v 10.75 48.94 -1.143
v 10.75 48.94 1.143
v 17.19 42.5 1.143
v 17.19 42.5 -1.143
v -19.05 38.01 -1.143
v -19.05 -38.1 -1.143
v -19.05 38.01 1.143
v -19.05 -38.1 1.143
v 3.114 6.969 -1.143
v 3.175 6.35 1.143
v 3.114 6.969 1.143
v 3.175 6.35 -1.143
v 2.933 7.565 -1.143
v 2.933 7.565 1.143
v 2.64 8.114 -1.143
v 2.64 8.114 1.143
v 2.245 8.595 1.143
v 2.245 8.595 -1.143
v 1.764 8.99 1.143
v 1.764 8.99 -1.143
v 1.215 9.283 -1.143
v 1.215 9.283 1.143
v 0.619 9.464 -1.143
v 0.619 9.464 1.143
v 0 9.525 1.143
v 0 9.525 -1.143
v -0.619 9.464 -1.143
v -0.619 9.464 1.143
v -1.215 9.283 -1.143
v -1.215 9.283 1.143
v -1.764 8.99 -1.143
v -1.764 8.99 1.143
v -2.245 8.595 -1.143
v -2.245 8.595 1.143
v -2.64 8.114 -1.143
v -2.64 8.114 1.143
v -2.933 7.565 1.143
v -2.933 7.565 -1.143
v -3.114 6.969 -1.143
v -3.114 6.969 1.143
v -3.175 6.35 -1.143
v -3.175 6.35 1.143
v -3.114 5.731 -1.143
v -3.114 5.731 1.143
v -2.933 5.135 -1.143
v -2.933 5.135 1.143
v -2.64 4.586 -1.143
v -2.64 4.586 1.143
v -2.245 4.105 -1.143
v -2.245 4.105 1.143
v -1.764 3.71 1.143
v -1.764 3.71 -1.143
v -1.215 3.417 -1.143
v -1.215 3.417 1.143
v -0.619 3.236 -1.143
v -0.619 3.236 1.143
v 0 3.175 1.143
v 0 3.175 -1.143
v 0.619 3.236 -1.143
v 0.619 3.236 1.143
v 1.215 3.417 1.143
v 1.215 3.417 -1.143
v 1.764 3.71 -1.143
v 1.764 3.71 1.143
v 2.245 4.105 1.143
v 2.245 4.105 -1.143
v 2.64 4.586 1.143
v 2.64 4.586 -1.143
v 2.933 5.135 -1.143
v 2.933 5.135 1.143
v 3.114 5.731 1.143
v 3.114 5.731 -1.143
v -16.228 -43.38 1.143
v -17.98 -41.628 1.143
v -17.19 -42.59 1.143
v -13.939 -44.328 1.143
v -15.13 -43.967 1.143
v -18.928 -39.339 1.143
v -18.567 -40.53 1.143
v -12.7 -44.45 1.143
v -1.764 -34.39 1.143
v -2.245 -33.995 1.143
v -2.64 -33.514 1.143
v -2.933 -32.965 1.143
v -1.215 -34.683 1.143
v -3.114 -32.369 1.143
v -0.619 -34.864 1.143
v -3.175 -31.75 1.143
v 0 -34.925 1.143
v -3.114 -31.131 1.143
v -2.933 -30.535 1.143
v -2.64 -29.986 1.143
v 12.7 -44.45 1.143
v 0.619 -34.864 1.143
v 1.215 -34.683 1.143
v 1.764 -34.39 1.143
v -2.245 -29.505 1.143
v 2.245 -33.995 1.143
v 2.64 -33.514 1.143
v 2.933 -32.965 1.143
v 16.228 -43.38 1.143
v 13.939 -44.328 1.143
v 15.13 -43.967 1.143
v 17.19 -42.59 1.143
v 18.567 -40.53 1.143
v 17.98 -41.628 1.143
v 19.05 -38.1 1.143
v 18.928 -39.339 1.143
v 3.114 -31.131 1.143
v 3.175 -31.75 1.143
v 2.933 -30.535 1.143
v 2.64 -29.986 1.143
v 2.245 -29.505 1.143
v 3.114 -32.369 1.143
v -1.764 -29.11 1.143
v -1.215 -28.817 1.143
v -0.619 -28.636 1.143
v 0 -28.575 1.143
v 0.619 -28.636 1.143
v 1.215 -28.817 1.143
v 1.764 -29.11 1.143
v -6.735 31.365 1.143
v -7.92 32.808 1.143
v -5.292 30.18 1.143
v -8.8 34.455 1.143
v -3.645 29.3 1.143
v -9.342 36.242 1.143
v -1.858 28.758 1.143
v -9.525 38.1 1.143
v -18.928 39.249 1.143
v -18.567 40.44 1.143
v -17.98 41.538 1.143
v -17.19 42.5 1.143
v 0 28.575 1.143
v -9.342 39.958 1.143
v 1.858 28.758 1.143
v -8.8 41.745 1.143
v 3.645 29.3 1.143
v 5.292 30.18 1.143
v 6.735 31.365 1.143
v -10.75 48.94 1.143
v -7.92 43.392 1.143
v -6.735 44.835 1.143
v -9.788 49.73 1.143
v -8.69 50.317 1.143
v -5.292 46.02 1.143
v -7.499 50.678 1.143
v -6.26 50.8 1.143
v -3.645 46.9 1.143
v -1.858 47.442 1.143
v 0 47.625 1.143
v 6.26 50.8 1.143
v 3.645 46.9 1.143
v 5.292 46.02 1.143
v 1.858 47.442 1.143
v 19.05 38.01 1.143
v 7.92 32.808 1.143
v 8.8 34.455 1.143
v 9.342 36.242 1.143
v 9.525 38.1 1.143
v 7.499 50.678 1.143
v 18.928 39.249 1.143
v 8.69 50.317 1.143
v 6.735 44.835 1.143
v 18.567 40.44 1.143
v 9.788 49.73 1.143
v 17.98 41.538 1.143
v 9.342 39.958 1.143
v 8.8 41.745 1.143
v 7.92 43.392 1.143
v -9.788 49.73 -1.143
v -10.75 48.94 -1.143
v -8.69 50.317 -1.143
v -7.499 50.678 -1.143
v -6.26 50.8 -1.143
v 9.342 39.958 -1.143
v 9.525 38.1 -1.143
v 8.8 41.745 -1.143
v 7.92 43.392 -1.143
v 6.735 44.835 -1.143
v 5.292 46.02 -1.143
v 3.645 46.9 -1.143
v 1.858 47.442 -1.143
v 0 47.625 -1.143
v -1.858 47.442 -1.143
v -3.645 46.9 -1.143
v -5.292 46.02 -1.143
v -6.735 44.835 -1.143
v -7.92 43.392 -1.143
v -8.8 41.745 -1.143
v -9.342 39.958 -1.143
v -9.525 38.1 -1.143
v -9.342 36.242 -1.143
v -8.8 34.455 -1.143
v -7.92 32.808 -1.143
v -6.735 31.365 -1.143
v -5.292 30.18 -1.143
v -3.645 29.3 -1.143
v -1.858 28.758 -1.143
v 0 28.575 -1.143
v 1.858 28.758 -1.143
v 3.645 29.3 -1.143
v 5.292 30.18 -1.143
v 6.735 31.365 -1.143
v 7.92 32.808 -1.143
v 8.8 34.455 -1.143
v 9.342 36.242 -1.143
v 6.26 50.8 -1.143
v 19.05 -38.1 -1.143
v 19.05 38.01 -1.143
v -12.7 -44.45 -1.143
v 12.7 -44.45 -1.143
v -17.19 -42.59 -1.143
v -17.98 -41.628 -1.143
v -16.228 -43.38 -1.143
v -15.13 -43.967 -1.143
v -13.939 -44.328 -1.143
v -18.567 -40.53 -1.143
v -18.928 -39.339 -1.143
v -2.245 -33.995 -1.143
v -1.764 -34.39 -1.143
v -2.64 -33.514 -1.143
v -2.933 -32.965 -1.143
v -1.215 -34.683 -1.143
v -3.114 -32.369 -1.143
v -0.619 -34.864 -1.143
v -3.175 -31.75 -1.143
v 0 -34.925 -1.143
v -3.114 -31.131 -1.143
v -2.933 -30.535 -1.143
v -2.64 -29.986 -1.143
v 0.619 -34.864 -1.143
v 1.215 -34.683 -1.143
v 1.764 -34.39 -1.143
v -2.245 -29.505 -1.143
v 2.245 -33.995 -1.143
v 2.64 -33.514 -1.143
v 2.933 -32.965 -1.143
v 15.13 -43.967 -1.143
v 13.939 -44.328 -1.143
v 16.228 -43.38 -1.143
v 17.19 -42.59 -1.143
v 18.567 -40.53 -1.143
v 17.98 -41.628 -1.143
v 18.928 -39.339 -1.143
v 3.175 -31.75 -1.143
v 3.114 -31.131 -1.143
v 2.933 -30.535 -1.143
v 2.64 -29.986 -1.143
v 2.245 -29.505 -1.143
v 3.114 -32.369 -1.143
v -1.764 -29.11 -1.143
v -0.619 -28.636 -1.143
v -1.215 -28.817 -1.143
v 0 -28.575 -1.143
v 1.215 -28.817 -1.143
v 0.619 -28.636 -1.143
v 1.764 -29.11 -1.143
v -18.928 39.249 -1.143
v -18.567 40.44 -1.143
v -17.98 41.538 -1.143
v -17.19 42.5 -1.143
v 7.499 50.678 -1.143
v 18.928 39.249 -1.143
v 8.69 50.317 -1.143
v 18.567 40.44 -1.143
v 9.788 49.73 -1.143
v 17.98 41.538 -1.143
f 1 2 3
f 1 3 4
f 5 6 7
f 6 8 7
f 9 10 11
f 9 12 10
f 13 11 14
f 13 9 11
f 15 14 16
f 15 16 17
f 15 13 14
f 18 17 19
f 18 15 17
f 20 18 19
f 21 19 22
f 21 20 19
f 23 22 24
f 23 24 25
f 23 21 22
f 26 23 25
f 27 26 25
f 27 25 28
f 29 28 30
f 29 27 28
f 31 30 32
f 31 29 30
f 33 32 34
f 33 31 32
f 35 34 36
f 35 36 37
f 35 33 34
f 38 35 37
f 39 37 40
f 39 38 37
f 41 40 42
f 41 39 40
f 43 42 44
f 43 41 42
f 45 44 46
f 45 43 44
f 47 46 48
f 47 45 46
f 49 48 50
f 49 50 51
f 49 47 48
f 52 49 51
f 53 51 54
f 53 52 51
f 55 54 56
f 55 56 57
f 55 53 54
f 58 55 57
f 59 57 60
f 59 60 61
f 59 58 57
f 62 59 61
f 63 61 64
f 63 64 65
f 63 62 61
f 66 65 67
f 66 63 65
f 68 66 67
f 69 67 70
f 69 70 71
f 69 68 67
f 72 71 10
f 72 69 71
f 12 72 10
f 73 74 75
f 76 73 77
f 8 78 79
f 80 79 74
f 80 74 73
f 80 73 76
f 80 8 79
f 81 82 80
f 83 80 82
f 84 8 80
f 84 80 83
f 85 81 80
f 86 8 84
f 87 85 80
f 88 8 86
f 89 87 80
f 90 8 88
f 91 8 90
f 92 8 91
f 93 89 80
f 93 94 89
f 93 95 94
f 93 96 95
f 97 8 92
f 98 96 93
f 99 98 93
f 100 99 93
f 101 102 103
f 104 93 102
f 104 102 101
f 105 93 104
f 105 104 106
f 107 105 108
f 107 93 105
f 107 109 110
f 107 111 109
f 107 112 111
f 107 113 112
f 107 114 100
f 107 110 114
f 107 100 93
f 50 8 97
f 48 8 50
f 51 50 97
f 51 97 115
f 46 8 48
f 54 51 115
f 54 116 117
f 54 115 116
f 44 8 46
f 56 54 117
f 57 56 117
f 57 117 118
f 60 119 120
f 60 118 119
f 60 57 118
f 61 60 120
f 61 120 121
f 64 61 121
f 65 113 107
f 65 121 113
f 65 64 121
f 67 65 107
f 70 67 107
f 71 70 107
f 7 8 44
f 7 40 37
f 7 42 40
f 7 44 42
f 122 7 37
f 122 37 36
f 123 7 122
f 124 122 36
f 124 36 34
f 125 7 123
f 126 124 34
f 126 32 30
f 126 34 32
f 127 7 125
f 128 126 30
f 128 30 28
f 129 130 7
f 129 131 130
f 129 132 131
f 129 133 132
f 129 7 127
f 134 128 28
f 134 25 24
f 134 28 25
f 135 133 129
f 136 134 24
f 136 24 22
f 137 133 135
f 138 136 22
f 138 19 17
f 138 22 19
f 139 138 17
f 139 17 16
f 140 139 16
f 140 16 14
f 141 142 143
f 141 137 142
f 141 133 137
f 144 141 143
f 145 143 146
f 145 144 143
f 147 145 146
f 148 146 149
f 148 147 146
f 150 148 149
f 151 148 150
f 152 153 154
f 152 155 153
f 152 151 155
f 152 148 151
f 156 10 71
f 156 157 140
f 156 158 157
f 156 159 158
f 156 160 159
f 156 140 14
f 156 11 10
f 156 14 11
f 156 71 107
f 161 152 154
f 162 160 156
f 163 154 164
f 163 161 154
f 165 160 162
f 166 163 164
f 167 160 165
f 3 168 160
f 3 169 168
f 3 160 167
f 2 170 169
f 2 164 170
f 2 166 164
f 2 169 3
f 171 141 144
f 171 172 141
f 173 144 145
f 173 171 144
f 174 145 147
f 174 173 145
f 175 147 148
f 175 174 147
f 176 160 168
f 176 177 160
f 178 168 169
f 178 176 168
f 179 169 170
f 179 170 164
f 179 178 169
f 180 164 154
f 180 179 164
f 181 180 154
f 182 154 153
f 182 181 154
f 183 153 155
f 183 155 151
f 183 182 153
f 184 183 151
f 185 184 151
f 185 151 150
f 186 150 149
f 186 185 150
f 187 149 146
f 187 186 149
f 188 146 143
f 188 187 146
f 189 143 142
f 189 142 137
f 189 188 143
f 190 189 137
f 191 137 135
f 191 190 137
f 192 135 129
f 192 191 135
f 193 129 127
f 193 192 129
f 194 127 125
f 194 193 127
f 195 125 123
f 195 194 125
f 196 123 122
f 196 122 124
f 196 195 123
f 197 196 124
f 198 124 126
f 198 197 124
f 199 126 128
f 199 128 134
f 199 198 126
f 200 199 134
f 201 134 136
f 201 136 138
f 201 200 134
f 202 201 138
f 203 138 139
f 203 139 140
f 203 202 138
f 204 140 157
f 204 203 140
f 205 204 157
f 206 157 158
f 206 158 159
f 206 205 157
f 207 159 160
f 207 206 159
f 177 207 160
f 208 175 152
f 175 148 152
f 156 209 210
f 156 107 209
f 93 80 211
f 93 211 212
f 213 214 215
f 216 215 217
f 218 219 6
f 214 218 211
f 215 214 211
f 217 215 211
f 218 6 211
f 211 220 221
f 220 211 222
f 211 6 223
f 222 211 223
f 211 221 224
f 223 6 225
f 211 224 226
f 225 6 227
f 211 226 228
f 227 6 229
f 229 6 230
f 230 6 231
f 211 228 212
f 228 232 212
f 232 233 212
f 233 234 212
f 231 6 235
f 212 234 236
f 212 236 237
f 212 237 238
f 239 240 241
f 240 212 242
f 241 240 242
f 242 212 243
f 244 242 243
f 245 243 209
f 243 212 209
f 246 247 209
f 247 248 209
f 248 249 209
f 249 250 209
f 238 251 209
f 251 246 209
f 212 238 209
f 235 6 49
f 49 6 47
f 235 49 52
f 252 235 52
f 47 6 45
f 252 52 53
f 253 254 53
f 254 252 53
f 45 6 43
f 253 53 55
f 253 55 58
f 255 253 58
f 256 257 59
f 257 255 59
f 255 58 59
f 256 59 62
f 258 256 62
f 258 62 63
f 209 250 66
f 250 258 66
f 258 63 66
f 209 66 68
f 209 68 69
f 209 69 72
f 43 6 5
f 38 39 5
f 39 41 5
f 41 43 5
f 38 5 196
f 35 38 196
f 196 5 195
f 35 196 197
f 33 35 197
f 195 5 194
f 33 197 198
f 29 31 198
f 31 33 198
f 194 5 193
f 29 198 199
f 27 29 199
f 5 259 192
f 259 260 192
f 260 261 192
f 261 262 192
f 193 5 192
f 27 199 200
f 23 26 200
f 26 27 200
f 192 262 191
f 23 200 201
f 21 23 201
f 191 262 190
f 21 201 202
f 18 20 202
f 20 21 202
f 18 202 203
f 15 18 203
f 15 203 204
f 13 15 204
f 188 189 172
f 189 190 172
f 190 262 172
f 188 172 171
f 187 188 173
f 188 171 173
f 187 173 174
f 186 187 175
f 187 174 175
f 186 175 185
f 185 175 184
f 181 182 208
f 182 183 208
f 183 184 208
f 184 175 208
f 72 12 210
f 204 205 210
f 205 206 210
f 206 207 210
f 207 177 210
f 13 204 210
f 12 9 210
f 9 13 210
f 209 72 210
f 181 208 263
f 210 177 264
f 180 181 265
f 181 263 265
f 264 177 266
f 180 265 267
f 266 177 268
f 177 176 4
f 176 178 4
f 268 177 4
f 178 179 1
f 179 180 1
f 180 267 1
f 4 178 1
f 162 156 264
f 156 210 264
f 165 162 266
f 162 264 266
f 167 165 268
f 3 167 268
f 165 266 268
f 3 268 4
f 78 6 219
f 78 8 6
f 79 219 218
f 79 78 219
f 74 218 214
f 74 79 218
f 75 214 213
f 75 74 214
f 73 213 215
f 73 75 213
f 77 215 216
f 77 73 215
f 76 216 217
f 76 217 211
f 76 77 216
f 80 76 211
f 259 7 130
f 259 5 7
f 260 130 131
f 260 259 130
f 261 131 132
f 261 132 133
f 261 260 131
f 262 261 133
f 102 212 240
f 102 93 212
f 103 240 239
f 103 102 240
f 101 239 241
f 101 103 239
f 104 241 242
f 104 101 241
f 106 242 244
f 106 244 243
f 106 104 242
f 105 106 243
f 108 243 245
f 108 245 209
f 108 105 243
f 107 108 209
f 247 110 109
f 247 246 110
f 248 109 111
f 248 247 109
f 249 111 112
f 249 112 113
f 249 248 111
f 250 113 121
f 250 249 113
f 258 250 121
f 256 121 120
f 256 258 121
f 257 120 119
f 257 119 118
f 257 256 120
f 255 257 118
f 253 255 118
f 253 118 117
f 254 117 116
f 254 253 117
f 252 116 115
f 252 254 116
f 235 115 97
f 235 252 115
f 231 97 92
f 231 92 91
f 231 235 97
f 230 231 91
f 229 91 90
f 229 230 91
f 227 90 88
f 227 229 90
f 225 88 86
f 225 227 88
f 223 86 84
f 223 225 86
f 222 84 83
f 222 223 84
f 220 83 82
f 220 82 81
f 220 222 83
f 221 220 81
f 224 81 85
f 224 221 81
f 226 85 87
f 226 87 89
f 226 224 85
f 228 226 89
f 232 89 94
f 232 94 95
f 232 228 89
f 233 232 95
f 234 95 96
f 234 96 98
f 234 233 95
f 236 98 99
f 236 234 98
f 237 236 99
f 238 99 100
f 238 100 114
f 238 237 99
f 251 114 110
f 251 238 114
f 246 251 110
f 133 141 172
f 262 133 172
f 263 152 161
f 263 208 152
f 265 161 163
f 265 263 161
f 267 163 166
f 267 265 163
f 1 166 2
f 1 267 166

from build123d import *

# Parameters (mm, degrees)
SKETCH1_W           = 38.1
SKETCH1_H           = 101.6
SKETCH1_R           = 3.175
SKETCH1_R_2         = 9.525
BOSS_EXTRUDE1_DEPTH = 1.143
CHAMFER1_SIZE       = 10.16
FILLET1_R           = 6.35
SKETCH2_W           = 38.1
SKETCH2_H           = 6.35
CUT_EXTRUDE1_DEPTH  = 55.302562518
FILLET2_R           = 6.35


with BuildPart() as part:
    # Sketch1 → Boss-Extrude1 (new, symmetric)
    with BuildSketch(Plane.XY):
        Rectangle(SKETCH1_W, SKETCH1_H)
        with Locations((0, -31.75)):
            Circle(SKETCH1_R, mode=Mode.SUBTRACT)
        with Locations((0, 6.35)):
            Circle(SKETCH1_R, mode=Mode.SUBTRACT)
        with Locations((0, 38.1)):
            Circle(SKETCH1_R_2, mode=Mode.SUBTRACT)
    extrude(amount=BOSS_EXTRUDE1_DEPTH, both=True)

    # Chamfer1
    chamfer1_edges = [part.edges().sort_by_distance(p)[0] for p in [
        (-19.05, 50.8, 0),
        (19.05, 50.8, 0),
    ]]
    chamfer(chamfer1_edges, length=CHAMFER1_SIZE)

    # Fillet1
    fillet1_edges = [part.edges().sort_by_distance(p)[0] for p in [
        (-19.05, 40.64, 0),
        (8.89, 50.8, 0),
        (-8.89, 50.8, 0),
        (19.05, 40.64, 0),
        (19.05, -50.8, 0),
        (-19.05, -50.8, 0),
    ]]
    fillet(fillet1_edges, radius=FILLET1_R)

    # Sketch2 → Cut-Extrude1 (cut, through all)
    with BuildSketch(Plane.XY.offset(1.143)):
        with Locations((0, -47.625)):
            Rectangle(SKETCH2_W, SKETCH2_H)
    extrude(amount=-CUT_EXTRUDE1_DEPTH, mode=Mode.SUBTRACT)

    # Fillet2
    fillet2_edges = [part.edges().sort_by_distance(p)[0] for p in [
        (-19.05, -44.45, 0),
        (19.05, -44.45, 0),
    ]]
    fillet(fillet2_edges, radius=FILLET2_R)


solid = part.part
